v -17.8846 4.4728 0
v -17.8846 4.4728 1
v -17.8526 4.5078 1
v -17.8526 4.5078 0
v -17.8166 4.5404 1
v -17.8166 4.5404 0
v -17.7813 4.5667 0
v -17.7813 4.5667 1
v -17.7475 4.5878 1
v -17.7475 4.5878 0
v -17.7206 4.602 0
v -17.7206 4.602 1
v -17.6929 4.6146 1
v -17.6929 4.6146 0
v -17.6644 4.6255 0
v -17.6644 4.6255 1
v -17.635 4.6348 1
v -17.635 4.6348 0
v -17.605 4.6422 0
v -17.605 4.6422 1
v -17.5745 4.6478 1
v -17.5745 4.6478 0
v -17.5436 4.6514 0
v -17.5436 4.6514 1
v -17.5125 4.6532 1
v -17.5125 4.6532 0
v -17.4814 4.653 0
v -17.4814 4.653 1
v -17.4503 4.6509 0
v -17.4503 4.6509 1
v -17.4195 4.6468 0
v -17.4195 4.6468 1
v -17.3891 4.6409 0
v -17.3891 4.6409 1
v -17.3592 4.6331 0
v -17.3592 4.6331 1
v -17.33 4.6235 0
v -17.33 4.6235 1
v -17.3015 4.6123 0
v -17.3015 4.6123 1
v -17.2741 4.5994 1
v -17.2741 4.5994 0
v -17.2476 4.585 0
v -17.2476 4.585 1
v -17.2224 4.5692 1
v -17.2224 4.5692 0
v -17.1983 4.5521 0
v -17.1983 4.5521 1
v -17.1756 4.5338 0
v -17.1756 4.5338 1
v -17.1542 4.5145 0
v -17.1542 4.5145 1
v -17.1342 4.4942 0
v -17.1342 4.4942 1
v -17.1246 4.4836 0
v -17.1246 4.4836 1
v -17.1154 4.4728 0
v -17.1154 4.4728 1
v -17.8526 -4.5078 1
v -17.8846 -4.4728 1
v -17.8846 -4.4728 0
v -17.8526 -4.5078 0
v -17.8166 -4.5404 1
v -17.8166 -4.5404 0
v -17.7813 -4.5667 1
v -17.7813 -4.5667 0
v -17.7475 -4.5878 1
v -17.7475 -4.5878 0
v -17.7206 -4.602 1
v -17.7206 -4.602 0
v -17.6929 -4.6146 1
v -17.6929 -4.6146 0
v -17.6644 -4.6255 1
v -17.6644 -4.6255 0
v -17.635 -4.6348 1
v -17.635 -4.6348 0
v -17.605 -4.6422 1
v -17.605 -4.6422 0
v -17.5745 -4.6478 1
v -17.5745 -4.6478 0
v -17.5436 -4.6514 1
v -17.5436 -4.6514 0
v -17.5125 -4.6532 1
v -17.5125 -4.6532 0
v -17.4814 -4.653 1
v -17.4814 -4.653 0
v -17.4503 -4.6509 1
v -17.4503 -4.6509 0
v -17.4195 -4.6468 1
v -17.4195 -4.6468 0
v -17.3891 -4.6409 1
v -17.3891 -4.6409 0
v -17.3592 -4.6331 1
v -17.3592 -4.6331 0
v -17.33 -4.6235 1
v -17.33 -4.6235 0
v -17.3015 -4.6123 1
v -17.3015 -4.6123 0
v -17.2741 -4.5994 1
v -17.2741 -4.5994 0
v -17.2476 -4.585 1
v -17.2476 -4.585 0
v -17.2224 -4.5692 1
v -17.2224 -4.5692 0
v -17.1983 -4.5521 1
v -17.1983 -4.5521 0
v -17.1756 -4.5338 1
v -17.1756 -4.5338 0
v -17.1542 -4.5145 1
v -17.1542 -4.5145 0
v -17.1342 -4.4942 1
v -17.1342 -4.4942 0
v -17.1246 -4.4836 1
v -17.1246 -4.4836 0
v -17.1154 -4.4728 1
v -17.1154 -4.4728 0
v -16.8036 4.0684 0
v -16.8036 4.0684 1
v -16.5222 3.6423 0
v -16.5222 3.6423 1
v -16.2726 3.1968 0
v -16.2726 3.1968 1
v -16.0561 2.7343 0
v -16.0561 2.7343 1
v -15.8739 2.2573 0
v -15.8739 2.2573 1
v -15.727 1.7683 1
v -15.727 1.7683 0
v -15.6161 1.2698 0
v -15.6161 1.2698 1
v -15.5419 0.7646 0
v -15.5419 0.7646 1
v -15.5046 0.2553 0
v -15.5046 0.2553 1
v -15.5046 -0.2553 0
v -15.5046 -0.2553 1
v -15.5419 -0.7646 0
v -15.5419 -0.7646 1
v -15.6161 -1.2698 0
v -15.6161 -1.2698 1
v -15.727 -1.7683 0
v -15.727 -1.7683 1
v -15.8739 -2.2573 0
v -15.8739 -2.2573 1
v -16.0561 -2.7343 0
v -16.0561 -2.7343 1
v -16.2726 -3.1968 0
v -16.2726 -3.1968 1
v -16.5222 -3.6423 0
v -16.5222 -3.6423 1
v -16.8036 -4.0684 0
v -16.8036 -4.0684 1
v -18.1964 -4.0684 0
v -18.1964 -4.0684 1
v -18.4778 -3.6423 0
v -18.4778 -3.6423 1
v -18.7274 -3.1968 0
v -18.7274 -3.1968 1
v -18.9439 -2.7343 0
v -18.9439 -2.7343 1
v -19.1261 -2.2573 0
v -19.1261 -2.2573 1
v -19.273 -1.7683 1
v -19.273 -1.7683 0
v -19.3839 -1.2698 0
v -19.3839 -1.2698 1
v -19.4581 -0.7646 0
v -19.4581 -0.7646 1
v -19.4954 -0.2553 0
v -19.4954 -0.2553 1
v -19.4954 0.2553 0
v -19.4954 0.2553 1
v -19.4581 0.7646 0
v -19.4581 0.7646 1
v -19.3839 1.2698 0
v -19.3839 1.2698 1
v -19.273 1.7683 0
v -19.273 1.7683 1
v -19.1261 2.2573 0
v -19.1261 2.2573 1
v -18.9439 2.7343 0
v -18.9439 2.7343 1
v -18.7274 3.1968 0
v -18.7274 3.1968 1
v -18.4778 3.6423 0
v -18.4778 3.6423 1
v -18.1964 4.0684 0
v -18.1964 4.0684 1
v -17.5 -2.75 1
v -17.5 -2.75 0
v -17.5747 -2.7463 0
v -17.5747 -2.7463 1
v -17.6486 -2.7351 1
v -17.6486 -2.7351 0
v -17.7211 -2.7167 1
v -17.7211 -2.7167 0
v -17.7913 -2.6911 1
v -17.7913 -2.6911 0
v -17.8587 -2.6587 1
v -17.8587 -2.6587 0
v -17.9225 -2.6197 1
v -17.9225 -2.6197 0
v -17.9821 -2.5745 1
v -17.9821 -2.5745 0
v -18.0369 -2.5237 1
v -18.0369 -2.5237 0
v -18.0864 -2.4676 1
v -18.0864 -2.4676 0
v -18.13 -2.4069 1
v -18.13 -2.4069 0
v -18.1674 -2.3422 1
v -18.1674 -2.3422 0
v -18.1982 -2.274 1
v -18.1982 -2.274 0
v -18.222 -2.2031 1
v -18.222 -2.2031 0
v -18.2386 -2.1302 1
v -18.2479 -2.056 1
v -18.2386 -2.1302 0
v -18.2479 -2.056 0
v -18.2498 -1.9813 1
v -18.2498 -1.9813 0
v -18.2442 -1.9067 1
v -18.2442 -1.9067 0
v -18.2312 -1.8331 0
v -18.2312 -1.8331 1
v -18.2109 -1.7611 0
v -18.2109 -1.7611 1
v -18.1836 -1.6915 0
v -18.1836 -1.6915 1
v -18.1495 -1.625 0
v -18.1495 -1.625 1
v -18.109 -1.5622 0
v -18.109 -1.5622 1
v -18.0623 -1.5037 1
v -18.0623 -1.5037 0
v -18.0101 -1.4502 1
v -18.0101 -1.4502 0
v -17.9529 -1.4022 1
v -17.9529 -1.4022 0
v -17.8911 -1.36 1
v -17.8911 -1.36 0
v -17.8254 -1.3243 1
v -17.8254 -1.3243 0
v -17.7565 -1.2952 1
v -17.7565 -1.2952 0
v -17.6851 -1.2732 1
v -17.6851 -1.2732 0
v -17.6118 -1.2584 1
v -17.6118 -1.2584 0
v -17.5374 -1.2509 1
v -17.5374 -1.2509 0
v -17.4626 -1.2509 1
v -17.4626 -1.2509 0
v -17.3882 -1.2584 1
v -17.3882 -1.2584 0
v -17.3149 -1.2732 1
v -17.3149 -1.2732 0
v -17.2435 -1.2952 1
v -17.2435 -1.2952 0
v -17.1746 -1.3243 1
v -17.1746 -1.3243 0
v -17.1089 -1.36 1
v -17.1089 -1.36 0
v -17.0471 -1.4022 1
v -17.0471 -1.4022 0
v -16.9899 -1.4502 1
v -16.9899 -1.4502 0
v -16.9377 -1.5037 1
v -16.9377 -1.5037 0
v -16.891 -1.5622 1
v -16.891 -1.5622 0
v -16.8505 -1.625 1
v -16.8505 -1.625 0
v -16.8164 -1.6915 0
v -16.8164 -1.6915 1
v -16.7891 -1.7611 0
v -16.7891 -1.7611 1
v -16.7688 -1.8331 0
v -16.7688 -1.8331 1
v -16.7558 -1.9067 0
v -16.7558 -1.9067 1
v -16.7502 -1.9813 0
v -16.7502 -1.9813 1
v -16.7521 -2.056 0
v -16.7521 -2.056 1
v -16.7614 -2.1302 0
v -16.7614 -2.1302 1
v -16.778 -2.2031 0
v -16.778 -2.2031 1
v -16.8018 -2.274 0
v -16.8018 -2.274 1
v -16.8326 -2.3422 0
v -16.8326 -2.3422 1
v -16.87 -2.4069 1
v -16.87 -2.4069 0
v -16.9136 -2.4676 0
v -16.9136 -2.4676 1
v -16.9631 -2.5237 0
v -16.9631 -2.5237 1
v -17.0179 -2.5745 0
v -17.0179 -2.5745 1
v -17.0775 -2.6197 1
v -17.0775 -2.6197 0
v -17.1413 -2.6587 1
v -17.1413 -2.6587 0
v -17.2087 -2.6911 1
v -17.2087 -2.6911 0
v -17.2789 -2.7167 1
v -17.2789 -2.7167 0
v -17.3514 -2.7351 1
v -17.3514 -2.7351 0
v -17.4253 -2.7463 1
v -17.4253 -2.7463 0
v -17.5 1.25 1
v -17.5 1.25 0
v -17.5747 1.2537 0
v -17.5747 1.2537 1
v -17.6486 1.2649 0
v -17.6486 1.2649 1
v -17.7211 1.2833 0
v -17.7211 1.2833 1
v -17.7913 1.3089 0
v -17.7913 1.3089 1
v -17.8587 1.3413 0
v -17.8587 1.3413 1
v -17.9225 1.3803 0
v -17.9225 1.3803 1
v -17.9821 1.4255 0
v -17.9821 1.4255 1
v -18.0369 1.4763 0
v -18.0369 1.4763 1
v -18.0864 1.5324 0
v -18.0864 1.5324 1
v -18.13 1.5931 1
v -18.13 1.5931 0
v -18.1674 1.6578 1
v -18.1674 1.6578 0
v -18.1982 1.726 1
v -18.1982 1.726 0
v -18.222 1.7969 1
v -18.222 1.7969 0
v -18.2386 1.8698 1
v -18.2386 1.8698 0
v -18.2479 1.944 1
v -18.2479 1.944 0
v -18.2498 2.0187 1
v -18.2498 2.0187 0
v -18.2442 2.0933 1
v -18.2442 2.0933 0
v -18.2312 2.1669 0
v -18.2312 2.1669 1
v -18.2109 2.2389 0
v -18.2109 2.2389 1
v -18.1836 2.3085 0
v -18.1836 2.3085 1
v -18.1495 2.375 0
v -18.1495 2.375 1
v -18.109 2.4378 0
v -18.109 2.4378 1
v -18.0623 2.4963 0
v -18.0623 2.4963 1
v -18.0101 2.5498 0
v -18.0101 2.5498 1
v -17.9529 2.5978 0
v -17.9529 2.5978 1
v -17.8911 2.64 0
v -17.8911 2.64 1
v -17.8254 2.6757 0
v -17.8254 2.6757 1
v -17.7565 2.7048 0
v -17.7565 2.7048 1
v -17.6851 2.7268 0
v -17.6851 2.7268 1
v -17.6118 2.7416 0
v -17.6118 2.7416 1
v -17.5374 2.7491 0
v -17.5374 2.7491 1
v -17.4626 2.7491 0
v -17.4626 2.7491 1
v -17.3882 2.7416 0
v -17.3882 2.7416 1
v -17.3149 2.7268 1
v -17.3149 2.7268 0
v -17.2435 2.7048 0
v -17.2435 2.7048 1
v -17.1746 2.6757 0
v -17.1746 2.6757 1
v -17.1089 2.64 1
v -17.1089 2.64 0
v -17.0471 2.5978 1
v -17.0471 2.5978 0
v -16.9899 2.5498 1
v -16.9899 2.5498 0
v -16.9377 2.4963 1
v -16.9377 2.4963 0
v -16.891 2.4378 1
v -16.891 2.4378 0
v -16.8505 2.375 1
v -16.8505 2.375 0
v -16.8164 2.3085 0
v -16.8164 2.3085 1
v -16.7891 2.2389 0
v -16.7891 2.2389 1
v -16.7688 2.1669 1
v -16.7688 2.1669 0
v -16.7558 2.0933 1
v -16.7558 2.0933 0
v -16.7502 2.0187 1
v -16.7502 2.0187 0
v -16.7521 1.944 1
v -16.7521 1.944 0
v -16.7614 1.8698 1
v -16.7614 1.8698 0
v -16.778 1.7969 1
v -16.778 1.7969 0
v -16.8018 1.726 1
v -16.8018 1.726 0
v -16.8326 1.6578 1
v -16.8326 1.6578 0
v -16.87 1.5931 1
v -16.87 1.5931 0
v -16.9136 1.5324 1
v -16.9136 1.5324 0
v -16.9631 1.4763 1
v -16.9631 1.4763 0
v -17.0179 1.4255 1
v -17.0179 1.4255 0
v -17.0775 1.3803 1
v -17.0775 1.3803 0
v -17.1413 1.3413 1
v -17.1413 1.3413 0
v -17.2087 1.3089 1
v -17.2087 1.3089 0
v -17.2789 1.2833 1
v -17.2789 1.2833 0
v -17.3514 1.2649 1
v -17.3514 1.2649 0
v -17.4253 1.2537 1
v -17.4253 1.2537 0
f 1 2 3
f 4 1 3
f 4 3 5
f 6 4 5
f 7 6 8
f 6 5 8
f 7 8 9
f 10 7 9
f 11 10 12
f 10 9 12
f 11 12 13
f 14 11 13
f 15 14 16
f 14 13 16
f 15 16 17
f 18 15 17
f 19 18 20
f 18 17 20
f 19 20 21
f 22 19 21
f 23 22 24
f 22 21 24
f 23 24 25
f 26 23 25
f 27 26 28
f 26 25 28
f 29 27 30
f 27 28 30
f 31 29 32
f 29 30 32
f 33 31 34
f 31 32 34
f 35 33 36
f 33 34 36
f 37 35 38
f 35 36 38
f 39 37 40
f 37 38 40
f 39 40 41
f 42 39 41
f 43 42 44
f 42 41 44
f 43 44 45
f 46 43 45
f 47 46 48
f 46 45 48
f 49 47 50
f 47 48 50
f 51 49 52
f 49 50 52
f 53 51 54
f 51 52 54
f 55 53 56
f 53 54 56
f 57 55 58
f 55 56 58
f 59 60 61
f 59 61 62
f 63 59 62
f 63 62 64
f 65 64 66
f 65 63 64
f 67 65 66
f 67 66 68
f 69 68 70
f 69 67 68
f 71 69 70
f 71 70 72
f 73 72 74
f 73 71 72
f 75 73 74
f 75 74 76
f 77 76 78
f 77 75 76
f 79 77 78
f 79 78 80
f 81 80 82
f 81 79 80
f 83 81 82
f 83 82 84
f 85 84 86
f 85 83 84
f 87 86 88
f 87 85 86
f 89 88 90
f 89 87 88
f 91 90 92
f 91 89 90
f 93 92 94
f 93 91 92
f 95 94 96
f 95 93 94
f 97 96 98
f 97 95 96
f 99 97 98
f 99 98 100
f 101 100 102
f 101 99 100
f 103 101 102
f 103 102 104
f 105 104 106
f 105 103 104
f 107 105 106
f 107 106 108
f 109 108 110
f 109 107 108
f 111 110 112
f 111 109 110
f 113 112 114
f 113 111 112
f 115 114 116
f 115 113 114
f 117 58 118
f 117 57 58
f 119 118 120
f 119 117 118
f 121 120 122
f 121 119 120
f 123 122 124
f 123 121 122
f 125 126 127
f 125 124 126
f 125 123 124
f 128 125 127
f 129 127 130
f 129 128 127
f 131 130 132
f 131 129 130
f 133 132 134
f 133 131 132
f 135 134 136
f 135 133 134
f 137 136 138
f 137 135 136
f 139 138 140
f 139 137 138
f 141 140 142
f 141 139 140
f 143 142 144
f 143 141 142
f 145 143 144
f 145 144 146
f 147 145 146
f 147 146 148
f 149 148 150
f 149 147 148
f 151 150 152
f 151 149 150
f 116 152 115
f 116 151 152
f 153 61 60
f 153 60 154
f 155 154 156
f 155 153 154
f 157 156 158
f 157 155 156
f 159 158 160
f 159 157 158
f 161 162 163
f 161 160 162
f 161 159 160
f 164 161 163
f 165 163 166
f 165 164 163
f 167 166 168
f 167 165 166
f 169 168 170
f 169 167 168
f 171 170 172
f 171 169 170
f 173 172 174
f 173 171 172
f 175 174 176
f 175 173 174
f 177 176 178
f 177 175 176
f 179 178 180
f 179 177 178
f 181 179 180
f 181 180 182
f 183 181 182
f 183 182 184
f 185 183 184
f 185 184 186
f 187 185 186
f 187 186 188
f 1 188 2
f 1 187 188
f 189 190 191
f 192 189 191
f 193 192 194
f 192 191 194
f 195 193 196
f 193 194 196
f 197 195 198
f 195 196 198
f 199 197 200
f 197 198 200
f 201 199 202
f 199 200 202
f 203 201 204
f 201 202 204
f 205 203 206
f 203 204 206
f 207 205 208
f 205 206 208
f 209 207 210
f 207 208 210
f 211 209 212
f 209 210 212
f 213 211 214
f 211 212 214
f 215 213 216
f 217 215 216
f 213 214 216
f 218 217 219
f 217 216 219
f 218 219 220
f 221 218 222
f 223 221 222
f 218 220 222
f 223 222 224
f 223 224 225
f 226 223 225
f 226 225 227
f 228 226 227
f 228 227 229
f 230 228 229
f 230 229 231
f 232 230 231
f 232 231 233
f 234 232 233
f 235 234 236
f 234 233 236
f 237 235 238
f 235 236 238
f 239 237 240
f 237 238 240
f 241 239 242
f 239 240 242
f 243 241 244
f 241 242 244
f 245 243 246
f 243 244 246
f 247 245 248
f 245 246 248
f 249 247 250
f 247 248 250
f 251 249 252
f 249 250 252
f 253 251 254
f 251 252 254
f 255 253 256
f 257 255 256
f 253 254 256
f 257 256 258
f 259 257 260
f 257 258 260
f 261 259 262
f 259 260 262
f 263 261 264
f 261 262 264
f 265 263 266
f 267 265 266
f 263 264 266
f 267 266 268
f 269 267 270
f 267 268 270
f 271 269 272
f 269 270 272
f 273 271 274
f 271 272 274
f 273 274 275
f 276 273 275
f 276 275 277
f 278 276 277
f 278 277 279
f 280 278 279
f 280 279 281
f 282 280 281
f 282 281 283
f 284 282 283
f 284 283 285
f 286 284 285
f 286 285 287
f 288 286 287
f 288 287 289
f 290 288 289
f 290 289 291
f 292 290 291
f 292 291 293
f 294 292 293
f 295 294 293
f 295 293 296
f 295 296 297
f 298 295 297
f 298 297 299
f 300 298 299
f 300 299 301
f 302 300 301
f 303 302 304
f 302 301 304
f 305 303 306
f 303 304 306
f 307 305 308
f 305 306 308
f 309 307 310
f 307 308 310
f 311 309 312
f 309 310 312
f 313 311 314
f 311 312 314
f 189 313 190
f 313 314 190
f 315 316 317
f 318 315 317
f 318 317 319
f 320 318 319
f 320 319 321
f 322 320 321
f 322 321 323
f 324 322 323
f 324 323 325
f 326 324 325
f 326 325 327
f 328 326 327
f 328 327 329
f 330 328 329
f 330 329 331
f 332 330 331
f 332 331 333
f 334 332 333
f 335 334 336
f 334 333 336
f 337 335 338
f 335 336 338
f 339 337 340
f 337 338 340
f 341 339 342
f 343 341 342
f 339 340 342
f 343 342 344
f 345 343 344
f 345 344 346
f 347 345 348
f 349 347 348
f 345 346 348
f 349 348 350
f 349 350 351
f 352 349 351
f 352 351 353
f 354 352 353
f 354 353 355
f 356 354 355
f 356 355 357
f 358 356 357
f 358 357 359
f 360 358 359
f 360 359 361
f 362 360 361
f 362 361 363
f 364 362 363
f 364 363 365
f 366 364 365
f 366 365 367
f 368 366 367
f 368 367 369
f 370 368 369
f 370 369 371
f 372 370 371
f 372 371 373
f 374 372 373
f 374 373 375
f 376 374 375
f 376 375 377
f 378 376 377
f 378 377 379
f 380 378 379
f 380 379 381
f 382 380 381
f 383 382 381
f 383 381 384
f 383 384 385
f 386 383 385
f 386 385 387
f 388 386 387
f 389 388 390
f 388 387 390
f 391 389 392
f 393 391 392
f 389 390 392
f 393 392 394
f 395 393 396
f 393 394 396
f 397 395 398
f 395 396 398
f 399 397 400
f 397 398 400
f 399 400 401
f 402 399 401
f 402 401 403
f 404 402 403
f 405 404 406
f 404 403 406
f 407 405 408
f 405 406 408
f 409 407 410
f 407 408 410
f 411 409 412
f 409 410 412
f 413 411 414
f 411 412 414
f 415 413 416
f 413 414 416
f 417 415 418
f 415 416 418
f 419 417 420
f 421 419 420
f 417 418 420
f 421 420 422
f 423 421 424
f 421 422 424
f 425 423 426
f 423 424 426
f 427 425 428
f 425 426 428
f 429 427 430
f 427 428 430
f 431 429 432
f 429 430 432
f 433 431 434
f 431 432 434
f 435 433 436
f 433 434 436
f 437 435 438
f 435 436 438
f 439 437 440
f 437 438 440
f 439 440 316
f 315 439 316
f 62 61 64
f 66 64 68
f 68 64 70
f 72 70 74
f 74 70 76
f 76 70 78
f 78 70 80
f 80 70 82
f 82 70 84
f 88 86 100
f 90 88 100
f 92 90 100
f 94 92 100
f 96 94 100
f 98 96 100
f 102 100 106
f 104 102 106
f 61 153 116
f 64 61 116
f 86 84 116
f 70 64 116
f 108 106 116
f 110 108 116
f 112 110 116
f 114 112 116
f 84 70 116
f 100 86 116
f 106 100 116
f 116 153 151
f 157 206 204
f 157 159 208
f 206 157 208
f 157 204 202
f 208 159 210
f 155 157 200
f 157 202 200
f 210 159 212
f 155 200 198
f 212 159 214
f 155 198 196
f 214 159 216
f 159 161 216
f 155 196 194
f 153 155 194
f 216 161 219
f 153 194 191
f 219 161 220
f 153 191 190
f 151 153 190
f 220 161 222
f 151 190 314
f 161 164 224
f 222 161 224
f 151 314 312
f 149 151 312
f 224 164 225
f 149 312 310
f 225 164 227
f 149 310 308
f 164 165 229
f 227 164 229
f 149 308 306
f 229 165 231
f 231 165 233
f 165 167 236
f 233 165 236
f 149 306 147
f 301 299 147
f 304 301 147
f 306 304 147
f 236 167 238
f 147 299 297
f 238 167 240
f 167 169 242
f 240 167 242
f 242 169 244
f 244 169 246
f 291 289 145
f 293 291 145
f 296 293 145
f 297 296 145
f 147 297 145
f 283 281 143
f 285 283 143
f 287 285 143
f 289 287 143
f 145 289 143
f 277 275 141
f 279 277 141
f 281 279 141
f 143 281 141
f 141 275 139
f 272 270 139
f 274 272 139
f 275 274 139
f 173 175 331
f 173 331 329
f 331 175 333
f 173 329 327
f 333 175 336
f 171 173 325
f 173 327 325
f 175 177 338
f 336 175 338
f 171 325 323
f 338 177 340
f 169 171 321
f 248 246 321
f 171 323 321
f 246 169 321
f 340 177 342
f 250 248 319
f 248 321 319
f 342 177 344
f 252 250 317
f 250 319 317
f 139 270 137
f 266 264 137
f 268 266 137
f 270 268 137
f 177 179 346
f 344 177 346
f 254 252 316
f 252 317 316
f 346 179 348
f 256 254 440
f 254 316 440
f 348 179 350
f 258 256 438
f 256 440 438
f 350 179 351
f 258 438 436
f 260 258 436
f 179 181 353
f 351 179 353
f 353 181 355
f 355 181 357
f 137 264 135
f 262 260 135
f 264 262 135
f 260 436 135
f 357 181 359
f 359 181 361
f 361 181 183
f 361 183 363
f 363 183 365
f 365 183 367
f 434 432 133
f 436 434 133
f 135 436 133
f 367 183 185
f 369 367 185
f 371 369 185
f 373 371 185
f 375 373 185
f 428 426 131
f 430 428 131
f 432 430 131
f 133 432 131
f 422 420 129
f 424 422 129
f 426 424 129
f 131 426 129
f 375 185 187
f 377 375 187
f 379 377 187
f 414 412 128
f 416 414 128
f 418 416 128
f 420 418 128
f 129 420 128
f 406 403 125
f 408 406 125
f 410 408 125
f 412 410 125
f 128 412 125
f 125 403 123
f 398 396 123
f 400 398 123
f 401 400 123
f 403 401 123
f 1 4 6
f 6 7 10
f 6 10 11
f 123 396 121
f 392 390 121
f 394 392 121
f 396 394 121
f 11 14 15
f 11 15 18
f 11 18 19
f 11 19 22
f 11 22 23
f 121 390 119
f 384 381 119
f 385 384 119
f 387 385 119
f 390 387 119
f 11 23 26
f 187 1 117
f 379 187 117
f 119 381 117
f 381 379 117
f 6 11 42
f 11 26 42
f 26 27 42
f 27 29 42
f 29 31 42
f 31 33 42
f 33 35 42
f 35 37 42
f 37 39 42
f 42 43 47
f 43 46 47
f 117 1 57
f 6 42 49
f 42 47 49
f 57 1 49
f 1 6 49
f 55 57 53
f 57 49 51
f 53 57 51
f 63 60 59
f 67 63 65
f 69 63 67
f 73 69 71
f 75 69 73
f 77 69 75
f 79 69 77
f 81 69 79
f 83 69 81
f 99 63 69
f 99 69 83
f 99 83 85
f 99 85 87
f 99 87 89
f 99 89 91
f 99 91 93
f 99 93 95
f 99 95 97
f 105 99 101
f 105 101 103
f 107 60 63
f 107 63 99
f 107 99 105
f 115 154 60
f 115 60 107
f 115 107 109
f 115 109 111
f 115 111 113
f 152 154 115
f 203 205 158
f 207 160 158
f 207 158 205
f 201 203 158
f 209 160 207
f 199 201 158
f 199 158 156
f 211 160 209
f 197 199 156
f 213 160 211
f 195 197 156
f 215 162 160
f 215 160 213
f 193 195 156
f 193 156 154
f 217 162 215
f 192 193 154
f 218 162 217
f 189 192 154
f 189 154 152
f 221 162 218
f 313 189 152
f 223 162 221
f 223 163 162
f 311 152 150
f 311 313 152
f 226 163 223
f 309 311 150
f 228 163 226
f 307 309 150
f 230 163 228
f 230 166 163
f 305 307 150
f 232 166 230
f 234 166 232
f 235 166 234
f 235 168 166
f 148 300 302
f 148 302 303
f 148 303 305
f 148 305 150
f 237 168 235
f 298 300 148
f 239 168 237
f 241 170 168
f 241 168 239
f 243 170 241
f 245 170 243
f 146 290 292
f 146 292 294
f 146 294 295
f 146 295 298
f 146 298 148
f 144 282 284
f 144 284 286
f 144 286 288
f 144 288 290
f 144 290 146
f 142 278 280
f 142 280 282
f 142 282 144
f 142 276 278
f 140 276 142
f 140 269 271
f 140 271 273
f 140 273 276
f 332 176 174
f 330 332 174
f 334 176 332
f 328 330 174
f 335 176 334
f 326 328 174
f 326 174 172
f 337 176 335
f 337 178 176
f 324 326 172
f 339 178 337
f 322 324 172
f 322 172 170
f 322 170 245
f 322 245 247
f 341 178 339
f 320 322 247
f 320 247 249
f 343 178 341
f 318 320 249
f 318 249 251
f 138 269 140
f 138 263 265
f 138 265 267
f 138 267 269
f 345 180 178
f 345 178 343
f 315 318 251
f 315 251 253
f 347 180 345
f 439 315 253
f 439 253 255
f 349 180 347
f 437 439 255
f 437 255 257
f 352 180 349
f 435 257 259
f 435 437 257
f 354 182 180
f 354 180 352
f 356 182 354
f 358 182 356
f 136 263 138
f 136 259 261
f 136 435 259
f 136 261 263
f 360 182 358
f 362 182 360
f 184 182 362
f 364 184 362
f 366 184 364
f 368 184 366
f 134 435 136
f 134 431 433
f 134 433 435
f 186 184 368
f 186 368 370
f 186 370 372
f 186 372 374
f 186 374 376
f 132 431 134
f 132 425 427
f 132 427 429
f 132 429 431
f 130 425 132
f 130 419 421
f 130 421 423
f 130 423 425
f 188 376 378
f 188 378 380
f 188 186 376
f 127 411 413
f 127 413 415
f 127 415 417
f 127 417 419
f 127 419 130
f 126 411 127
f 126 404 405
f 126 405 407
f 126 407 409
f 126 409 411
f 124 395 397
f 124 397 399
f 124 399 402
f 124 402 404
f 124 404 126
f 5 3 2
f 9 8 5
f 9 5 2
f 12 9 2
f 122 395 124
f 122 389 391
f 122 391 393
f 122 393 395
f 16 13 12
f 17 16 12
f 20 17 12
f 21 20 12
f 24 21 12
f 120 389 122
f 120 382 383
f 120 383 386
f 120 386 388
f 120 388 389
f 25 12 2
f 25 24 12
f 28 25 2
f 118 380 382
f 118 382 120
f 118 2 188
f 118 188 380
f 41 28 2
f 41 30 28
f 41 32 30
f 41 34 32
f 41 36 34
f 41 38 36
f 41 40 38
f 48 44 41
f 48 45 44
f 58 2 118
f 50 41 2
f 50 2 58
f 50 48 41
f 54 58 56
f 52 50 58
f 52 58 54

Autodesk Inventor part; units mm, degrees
ref_plane "YZ Plane" through (0, 0, 0) normal (1, 0, 0) x (0, 1, 0)
ref_plane "XZ Plane" through (0, 0, 0) normal (0, 1, 0) x (-1, 0, 0)
ref_plane "XY Plane" through (0, 0, 0) normal (0, 0, 1) x (1, 0, 0)
sketch "Sketch2" plane through (0, 0, 0) normal (0, 0, 1) x (1, 0, 0)
  point P0 (0, 0)
  point P1 (-17.5, 0)
  dimension "d6" = 17.5
sketch "Sketch1" plane through (0, 0, 0) normal (0, 0, 1) x (1, 0, 0)
  arc A0 (-17.5, -4.899) -> (-17.5, 4.899) centre (-22.5, 0) ccw
  arc A1 (-17.5, 4.899) -> (-17.5, -4.899) centre (-12.5, 0) ccw
  line L0 (-15.5, 0) -> (-15.5, 11.1541) construction
  point P0 (-17.5, 0)
  dimension "d3" = 14
  dimension "d4" = 14
  dimension "d5" = 10
  dimension "d7" = 2
extrude "Extrusion1" add sketch "Sketch1" along normal blind 1
sketch "Sketch3" plane through (0, 0, 1) normal (0, 0, 1) x (1, 0, 0)
  point P0 (0, 0)
  point P1 (-17.5, 0)
  point P2 (-17.5, 2)
  point P3 (-17.5, -2)
  dimension "d10" = 2
  dimension "d11" = 2
hole "Hole1" at (-17.5, 2, 1) at (-17.5, -2, 1) direction (0, 0, -1) diameter 1.5 end through all
fillet "Fillet1" radius 0.5 2 edges at (-17.5, -4.899, 0.5) (-17.5, 4.899, 0.5)
properties part number "phalanx 3 spring pins support"
